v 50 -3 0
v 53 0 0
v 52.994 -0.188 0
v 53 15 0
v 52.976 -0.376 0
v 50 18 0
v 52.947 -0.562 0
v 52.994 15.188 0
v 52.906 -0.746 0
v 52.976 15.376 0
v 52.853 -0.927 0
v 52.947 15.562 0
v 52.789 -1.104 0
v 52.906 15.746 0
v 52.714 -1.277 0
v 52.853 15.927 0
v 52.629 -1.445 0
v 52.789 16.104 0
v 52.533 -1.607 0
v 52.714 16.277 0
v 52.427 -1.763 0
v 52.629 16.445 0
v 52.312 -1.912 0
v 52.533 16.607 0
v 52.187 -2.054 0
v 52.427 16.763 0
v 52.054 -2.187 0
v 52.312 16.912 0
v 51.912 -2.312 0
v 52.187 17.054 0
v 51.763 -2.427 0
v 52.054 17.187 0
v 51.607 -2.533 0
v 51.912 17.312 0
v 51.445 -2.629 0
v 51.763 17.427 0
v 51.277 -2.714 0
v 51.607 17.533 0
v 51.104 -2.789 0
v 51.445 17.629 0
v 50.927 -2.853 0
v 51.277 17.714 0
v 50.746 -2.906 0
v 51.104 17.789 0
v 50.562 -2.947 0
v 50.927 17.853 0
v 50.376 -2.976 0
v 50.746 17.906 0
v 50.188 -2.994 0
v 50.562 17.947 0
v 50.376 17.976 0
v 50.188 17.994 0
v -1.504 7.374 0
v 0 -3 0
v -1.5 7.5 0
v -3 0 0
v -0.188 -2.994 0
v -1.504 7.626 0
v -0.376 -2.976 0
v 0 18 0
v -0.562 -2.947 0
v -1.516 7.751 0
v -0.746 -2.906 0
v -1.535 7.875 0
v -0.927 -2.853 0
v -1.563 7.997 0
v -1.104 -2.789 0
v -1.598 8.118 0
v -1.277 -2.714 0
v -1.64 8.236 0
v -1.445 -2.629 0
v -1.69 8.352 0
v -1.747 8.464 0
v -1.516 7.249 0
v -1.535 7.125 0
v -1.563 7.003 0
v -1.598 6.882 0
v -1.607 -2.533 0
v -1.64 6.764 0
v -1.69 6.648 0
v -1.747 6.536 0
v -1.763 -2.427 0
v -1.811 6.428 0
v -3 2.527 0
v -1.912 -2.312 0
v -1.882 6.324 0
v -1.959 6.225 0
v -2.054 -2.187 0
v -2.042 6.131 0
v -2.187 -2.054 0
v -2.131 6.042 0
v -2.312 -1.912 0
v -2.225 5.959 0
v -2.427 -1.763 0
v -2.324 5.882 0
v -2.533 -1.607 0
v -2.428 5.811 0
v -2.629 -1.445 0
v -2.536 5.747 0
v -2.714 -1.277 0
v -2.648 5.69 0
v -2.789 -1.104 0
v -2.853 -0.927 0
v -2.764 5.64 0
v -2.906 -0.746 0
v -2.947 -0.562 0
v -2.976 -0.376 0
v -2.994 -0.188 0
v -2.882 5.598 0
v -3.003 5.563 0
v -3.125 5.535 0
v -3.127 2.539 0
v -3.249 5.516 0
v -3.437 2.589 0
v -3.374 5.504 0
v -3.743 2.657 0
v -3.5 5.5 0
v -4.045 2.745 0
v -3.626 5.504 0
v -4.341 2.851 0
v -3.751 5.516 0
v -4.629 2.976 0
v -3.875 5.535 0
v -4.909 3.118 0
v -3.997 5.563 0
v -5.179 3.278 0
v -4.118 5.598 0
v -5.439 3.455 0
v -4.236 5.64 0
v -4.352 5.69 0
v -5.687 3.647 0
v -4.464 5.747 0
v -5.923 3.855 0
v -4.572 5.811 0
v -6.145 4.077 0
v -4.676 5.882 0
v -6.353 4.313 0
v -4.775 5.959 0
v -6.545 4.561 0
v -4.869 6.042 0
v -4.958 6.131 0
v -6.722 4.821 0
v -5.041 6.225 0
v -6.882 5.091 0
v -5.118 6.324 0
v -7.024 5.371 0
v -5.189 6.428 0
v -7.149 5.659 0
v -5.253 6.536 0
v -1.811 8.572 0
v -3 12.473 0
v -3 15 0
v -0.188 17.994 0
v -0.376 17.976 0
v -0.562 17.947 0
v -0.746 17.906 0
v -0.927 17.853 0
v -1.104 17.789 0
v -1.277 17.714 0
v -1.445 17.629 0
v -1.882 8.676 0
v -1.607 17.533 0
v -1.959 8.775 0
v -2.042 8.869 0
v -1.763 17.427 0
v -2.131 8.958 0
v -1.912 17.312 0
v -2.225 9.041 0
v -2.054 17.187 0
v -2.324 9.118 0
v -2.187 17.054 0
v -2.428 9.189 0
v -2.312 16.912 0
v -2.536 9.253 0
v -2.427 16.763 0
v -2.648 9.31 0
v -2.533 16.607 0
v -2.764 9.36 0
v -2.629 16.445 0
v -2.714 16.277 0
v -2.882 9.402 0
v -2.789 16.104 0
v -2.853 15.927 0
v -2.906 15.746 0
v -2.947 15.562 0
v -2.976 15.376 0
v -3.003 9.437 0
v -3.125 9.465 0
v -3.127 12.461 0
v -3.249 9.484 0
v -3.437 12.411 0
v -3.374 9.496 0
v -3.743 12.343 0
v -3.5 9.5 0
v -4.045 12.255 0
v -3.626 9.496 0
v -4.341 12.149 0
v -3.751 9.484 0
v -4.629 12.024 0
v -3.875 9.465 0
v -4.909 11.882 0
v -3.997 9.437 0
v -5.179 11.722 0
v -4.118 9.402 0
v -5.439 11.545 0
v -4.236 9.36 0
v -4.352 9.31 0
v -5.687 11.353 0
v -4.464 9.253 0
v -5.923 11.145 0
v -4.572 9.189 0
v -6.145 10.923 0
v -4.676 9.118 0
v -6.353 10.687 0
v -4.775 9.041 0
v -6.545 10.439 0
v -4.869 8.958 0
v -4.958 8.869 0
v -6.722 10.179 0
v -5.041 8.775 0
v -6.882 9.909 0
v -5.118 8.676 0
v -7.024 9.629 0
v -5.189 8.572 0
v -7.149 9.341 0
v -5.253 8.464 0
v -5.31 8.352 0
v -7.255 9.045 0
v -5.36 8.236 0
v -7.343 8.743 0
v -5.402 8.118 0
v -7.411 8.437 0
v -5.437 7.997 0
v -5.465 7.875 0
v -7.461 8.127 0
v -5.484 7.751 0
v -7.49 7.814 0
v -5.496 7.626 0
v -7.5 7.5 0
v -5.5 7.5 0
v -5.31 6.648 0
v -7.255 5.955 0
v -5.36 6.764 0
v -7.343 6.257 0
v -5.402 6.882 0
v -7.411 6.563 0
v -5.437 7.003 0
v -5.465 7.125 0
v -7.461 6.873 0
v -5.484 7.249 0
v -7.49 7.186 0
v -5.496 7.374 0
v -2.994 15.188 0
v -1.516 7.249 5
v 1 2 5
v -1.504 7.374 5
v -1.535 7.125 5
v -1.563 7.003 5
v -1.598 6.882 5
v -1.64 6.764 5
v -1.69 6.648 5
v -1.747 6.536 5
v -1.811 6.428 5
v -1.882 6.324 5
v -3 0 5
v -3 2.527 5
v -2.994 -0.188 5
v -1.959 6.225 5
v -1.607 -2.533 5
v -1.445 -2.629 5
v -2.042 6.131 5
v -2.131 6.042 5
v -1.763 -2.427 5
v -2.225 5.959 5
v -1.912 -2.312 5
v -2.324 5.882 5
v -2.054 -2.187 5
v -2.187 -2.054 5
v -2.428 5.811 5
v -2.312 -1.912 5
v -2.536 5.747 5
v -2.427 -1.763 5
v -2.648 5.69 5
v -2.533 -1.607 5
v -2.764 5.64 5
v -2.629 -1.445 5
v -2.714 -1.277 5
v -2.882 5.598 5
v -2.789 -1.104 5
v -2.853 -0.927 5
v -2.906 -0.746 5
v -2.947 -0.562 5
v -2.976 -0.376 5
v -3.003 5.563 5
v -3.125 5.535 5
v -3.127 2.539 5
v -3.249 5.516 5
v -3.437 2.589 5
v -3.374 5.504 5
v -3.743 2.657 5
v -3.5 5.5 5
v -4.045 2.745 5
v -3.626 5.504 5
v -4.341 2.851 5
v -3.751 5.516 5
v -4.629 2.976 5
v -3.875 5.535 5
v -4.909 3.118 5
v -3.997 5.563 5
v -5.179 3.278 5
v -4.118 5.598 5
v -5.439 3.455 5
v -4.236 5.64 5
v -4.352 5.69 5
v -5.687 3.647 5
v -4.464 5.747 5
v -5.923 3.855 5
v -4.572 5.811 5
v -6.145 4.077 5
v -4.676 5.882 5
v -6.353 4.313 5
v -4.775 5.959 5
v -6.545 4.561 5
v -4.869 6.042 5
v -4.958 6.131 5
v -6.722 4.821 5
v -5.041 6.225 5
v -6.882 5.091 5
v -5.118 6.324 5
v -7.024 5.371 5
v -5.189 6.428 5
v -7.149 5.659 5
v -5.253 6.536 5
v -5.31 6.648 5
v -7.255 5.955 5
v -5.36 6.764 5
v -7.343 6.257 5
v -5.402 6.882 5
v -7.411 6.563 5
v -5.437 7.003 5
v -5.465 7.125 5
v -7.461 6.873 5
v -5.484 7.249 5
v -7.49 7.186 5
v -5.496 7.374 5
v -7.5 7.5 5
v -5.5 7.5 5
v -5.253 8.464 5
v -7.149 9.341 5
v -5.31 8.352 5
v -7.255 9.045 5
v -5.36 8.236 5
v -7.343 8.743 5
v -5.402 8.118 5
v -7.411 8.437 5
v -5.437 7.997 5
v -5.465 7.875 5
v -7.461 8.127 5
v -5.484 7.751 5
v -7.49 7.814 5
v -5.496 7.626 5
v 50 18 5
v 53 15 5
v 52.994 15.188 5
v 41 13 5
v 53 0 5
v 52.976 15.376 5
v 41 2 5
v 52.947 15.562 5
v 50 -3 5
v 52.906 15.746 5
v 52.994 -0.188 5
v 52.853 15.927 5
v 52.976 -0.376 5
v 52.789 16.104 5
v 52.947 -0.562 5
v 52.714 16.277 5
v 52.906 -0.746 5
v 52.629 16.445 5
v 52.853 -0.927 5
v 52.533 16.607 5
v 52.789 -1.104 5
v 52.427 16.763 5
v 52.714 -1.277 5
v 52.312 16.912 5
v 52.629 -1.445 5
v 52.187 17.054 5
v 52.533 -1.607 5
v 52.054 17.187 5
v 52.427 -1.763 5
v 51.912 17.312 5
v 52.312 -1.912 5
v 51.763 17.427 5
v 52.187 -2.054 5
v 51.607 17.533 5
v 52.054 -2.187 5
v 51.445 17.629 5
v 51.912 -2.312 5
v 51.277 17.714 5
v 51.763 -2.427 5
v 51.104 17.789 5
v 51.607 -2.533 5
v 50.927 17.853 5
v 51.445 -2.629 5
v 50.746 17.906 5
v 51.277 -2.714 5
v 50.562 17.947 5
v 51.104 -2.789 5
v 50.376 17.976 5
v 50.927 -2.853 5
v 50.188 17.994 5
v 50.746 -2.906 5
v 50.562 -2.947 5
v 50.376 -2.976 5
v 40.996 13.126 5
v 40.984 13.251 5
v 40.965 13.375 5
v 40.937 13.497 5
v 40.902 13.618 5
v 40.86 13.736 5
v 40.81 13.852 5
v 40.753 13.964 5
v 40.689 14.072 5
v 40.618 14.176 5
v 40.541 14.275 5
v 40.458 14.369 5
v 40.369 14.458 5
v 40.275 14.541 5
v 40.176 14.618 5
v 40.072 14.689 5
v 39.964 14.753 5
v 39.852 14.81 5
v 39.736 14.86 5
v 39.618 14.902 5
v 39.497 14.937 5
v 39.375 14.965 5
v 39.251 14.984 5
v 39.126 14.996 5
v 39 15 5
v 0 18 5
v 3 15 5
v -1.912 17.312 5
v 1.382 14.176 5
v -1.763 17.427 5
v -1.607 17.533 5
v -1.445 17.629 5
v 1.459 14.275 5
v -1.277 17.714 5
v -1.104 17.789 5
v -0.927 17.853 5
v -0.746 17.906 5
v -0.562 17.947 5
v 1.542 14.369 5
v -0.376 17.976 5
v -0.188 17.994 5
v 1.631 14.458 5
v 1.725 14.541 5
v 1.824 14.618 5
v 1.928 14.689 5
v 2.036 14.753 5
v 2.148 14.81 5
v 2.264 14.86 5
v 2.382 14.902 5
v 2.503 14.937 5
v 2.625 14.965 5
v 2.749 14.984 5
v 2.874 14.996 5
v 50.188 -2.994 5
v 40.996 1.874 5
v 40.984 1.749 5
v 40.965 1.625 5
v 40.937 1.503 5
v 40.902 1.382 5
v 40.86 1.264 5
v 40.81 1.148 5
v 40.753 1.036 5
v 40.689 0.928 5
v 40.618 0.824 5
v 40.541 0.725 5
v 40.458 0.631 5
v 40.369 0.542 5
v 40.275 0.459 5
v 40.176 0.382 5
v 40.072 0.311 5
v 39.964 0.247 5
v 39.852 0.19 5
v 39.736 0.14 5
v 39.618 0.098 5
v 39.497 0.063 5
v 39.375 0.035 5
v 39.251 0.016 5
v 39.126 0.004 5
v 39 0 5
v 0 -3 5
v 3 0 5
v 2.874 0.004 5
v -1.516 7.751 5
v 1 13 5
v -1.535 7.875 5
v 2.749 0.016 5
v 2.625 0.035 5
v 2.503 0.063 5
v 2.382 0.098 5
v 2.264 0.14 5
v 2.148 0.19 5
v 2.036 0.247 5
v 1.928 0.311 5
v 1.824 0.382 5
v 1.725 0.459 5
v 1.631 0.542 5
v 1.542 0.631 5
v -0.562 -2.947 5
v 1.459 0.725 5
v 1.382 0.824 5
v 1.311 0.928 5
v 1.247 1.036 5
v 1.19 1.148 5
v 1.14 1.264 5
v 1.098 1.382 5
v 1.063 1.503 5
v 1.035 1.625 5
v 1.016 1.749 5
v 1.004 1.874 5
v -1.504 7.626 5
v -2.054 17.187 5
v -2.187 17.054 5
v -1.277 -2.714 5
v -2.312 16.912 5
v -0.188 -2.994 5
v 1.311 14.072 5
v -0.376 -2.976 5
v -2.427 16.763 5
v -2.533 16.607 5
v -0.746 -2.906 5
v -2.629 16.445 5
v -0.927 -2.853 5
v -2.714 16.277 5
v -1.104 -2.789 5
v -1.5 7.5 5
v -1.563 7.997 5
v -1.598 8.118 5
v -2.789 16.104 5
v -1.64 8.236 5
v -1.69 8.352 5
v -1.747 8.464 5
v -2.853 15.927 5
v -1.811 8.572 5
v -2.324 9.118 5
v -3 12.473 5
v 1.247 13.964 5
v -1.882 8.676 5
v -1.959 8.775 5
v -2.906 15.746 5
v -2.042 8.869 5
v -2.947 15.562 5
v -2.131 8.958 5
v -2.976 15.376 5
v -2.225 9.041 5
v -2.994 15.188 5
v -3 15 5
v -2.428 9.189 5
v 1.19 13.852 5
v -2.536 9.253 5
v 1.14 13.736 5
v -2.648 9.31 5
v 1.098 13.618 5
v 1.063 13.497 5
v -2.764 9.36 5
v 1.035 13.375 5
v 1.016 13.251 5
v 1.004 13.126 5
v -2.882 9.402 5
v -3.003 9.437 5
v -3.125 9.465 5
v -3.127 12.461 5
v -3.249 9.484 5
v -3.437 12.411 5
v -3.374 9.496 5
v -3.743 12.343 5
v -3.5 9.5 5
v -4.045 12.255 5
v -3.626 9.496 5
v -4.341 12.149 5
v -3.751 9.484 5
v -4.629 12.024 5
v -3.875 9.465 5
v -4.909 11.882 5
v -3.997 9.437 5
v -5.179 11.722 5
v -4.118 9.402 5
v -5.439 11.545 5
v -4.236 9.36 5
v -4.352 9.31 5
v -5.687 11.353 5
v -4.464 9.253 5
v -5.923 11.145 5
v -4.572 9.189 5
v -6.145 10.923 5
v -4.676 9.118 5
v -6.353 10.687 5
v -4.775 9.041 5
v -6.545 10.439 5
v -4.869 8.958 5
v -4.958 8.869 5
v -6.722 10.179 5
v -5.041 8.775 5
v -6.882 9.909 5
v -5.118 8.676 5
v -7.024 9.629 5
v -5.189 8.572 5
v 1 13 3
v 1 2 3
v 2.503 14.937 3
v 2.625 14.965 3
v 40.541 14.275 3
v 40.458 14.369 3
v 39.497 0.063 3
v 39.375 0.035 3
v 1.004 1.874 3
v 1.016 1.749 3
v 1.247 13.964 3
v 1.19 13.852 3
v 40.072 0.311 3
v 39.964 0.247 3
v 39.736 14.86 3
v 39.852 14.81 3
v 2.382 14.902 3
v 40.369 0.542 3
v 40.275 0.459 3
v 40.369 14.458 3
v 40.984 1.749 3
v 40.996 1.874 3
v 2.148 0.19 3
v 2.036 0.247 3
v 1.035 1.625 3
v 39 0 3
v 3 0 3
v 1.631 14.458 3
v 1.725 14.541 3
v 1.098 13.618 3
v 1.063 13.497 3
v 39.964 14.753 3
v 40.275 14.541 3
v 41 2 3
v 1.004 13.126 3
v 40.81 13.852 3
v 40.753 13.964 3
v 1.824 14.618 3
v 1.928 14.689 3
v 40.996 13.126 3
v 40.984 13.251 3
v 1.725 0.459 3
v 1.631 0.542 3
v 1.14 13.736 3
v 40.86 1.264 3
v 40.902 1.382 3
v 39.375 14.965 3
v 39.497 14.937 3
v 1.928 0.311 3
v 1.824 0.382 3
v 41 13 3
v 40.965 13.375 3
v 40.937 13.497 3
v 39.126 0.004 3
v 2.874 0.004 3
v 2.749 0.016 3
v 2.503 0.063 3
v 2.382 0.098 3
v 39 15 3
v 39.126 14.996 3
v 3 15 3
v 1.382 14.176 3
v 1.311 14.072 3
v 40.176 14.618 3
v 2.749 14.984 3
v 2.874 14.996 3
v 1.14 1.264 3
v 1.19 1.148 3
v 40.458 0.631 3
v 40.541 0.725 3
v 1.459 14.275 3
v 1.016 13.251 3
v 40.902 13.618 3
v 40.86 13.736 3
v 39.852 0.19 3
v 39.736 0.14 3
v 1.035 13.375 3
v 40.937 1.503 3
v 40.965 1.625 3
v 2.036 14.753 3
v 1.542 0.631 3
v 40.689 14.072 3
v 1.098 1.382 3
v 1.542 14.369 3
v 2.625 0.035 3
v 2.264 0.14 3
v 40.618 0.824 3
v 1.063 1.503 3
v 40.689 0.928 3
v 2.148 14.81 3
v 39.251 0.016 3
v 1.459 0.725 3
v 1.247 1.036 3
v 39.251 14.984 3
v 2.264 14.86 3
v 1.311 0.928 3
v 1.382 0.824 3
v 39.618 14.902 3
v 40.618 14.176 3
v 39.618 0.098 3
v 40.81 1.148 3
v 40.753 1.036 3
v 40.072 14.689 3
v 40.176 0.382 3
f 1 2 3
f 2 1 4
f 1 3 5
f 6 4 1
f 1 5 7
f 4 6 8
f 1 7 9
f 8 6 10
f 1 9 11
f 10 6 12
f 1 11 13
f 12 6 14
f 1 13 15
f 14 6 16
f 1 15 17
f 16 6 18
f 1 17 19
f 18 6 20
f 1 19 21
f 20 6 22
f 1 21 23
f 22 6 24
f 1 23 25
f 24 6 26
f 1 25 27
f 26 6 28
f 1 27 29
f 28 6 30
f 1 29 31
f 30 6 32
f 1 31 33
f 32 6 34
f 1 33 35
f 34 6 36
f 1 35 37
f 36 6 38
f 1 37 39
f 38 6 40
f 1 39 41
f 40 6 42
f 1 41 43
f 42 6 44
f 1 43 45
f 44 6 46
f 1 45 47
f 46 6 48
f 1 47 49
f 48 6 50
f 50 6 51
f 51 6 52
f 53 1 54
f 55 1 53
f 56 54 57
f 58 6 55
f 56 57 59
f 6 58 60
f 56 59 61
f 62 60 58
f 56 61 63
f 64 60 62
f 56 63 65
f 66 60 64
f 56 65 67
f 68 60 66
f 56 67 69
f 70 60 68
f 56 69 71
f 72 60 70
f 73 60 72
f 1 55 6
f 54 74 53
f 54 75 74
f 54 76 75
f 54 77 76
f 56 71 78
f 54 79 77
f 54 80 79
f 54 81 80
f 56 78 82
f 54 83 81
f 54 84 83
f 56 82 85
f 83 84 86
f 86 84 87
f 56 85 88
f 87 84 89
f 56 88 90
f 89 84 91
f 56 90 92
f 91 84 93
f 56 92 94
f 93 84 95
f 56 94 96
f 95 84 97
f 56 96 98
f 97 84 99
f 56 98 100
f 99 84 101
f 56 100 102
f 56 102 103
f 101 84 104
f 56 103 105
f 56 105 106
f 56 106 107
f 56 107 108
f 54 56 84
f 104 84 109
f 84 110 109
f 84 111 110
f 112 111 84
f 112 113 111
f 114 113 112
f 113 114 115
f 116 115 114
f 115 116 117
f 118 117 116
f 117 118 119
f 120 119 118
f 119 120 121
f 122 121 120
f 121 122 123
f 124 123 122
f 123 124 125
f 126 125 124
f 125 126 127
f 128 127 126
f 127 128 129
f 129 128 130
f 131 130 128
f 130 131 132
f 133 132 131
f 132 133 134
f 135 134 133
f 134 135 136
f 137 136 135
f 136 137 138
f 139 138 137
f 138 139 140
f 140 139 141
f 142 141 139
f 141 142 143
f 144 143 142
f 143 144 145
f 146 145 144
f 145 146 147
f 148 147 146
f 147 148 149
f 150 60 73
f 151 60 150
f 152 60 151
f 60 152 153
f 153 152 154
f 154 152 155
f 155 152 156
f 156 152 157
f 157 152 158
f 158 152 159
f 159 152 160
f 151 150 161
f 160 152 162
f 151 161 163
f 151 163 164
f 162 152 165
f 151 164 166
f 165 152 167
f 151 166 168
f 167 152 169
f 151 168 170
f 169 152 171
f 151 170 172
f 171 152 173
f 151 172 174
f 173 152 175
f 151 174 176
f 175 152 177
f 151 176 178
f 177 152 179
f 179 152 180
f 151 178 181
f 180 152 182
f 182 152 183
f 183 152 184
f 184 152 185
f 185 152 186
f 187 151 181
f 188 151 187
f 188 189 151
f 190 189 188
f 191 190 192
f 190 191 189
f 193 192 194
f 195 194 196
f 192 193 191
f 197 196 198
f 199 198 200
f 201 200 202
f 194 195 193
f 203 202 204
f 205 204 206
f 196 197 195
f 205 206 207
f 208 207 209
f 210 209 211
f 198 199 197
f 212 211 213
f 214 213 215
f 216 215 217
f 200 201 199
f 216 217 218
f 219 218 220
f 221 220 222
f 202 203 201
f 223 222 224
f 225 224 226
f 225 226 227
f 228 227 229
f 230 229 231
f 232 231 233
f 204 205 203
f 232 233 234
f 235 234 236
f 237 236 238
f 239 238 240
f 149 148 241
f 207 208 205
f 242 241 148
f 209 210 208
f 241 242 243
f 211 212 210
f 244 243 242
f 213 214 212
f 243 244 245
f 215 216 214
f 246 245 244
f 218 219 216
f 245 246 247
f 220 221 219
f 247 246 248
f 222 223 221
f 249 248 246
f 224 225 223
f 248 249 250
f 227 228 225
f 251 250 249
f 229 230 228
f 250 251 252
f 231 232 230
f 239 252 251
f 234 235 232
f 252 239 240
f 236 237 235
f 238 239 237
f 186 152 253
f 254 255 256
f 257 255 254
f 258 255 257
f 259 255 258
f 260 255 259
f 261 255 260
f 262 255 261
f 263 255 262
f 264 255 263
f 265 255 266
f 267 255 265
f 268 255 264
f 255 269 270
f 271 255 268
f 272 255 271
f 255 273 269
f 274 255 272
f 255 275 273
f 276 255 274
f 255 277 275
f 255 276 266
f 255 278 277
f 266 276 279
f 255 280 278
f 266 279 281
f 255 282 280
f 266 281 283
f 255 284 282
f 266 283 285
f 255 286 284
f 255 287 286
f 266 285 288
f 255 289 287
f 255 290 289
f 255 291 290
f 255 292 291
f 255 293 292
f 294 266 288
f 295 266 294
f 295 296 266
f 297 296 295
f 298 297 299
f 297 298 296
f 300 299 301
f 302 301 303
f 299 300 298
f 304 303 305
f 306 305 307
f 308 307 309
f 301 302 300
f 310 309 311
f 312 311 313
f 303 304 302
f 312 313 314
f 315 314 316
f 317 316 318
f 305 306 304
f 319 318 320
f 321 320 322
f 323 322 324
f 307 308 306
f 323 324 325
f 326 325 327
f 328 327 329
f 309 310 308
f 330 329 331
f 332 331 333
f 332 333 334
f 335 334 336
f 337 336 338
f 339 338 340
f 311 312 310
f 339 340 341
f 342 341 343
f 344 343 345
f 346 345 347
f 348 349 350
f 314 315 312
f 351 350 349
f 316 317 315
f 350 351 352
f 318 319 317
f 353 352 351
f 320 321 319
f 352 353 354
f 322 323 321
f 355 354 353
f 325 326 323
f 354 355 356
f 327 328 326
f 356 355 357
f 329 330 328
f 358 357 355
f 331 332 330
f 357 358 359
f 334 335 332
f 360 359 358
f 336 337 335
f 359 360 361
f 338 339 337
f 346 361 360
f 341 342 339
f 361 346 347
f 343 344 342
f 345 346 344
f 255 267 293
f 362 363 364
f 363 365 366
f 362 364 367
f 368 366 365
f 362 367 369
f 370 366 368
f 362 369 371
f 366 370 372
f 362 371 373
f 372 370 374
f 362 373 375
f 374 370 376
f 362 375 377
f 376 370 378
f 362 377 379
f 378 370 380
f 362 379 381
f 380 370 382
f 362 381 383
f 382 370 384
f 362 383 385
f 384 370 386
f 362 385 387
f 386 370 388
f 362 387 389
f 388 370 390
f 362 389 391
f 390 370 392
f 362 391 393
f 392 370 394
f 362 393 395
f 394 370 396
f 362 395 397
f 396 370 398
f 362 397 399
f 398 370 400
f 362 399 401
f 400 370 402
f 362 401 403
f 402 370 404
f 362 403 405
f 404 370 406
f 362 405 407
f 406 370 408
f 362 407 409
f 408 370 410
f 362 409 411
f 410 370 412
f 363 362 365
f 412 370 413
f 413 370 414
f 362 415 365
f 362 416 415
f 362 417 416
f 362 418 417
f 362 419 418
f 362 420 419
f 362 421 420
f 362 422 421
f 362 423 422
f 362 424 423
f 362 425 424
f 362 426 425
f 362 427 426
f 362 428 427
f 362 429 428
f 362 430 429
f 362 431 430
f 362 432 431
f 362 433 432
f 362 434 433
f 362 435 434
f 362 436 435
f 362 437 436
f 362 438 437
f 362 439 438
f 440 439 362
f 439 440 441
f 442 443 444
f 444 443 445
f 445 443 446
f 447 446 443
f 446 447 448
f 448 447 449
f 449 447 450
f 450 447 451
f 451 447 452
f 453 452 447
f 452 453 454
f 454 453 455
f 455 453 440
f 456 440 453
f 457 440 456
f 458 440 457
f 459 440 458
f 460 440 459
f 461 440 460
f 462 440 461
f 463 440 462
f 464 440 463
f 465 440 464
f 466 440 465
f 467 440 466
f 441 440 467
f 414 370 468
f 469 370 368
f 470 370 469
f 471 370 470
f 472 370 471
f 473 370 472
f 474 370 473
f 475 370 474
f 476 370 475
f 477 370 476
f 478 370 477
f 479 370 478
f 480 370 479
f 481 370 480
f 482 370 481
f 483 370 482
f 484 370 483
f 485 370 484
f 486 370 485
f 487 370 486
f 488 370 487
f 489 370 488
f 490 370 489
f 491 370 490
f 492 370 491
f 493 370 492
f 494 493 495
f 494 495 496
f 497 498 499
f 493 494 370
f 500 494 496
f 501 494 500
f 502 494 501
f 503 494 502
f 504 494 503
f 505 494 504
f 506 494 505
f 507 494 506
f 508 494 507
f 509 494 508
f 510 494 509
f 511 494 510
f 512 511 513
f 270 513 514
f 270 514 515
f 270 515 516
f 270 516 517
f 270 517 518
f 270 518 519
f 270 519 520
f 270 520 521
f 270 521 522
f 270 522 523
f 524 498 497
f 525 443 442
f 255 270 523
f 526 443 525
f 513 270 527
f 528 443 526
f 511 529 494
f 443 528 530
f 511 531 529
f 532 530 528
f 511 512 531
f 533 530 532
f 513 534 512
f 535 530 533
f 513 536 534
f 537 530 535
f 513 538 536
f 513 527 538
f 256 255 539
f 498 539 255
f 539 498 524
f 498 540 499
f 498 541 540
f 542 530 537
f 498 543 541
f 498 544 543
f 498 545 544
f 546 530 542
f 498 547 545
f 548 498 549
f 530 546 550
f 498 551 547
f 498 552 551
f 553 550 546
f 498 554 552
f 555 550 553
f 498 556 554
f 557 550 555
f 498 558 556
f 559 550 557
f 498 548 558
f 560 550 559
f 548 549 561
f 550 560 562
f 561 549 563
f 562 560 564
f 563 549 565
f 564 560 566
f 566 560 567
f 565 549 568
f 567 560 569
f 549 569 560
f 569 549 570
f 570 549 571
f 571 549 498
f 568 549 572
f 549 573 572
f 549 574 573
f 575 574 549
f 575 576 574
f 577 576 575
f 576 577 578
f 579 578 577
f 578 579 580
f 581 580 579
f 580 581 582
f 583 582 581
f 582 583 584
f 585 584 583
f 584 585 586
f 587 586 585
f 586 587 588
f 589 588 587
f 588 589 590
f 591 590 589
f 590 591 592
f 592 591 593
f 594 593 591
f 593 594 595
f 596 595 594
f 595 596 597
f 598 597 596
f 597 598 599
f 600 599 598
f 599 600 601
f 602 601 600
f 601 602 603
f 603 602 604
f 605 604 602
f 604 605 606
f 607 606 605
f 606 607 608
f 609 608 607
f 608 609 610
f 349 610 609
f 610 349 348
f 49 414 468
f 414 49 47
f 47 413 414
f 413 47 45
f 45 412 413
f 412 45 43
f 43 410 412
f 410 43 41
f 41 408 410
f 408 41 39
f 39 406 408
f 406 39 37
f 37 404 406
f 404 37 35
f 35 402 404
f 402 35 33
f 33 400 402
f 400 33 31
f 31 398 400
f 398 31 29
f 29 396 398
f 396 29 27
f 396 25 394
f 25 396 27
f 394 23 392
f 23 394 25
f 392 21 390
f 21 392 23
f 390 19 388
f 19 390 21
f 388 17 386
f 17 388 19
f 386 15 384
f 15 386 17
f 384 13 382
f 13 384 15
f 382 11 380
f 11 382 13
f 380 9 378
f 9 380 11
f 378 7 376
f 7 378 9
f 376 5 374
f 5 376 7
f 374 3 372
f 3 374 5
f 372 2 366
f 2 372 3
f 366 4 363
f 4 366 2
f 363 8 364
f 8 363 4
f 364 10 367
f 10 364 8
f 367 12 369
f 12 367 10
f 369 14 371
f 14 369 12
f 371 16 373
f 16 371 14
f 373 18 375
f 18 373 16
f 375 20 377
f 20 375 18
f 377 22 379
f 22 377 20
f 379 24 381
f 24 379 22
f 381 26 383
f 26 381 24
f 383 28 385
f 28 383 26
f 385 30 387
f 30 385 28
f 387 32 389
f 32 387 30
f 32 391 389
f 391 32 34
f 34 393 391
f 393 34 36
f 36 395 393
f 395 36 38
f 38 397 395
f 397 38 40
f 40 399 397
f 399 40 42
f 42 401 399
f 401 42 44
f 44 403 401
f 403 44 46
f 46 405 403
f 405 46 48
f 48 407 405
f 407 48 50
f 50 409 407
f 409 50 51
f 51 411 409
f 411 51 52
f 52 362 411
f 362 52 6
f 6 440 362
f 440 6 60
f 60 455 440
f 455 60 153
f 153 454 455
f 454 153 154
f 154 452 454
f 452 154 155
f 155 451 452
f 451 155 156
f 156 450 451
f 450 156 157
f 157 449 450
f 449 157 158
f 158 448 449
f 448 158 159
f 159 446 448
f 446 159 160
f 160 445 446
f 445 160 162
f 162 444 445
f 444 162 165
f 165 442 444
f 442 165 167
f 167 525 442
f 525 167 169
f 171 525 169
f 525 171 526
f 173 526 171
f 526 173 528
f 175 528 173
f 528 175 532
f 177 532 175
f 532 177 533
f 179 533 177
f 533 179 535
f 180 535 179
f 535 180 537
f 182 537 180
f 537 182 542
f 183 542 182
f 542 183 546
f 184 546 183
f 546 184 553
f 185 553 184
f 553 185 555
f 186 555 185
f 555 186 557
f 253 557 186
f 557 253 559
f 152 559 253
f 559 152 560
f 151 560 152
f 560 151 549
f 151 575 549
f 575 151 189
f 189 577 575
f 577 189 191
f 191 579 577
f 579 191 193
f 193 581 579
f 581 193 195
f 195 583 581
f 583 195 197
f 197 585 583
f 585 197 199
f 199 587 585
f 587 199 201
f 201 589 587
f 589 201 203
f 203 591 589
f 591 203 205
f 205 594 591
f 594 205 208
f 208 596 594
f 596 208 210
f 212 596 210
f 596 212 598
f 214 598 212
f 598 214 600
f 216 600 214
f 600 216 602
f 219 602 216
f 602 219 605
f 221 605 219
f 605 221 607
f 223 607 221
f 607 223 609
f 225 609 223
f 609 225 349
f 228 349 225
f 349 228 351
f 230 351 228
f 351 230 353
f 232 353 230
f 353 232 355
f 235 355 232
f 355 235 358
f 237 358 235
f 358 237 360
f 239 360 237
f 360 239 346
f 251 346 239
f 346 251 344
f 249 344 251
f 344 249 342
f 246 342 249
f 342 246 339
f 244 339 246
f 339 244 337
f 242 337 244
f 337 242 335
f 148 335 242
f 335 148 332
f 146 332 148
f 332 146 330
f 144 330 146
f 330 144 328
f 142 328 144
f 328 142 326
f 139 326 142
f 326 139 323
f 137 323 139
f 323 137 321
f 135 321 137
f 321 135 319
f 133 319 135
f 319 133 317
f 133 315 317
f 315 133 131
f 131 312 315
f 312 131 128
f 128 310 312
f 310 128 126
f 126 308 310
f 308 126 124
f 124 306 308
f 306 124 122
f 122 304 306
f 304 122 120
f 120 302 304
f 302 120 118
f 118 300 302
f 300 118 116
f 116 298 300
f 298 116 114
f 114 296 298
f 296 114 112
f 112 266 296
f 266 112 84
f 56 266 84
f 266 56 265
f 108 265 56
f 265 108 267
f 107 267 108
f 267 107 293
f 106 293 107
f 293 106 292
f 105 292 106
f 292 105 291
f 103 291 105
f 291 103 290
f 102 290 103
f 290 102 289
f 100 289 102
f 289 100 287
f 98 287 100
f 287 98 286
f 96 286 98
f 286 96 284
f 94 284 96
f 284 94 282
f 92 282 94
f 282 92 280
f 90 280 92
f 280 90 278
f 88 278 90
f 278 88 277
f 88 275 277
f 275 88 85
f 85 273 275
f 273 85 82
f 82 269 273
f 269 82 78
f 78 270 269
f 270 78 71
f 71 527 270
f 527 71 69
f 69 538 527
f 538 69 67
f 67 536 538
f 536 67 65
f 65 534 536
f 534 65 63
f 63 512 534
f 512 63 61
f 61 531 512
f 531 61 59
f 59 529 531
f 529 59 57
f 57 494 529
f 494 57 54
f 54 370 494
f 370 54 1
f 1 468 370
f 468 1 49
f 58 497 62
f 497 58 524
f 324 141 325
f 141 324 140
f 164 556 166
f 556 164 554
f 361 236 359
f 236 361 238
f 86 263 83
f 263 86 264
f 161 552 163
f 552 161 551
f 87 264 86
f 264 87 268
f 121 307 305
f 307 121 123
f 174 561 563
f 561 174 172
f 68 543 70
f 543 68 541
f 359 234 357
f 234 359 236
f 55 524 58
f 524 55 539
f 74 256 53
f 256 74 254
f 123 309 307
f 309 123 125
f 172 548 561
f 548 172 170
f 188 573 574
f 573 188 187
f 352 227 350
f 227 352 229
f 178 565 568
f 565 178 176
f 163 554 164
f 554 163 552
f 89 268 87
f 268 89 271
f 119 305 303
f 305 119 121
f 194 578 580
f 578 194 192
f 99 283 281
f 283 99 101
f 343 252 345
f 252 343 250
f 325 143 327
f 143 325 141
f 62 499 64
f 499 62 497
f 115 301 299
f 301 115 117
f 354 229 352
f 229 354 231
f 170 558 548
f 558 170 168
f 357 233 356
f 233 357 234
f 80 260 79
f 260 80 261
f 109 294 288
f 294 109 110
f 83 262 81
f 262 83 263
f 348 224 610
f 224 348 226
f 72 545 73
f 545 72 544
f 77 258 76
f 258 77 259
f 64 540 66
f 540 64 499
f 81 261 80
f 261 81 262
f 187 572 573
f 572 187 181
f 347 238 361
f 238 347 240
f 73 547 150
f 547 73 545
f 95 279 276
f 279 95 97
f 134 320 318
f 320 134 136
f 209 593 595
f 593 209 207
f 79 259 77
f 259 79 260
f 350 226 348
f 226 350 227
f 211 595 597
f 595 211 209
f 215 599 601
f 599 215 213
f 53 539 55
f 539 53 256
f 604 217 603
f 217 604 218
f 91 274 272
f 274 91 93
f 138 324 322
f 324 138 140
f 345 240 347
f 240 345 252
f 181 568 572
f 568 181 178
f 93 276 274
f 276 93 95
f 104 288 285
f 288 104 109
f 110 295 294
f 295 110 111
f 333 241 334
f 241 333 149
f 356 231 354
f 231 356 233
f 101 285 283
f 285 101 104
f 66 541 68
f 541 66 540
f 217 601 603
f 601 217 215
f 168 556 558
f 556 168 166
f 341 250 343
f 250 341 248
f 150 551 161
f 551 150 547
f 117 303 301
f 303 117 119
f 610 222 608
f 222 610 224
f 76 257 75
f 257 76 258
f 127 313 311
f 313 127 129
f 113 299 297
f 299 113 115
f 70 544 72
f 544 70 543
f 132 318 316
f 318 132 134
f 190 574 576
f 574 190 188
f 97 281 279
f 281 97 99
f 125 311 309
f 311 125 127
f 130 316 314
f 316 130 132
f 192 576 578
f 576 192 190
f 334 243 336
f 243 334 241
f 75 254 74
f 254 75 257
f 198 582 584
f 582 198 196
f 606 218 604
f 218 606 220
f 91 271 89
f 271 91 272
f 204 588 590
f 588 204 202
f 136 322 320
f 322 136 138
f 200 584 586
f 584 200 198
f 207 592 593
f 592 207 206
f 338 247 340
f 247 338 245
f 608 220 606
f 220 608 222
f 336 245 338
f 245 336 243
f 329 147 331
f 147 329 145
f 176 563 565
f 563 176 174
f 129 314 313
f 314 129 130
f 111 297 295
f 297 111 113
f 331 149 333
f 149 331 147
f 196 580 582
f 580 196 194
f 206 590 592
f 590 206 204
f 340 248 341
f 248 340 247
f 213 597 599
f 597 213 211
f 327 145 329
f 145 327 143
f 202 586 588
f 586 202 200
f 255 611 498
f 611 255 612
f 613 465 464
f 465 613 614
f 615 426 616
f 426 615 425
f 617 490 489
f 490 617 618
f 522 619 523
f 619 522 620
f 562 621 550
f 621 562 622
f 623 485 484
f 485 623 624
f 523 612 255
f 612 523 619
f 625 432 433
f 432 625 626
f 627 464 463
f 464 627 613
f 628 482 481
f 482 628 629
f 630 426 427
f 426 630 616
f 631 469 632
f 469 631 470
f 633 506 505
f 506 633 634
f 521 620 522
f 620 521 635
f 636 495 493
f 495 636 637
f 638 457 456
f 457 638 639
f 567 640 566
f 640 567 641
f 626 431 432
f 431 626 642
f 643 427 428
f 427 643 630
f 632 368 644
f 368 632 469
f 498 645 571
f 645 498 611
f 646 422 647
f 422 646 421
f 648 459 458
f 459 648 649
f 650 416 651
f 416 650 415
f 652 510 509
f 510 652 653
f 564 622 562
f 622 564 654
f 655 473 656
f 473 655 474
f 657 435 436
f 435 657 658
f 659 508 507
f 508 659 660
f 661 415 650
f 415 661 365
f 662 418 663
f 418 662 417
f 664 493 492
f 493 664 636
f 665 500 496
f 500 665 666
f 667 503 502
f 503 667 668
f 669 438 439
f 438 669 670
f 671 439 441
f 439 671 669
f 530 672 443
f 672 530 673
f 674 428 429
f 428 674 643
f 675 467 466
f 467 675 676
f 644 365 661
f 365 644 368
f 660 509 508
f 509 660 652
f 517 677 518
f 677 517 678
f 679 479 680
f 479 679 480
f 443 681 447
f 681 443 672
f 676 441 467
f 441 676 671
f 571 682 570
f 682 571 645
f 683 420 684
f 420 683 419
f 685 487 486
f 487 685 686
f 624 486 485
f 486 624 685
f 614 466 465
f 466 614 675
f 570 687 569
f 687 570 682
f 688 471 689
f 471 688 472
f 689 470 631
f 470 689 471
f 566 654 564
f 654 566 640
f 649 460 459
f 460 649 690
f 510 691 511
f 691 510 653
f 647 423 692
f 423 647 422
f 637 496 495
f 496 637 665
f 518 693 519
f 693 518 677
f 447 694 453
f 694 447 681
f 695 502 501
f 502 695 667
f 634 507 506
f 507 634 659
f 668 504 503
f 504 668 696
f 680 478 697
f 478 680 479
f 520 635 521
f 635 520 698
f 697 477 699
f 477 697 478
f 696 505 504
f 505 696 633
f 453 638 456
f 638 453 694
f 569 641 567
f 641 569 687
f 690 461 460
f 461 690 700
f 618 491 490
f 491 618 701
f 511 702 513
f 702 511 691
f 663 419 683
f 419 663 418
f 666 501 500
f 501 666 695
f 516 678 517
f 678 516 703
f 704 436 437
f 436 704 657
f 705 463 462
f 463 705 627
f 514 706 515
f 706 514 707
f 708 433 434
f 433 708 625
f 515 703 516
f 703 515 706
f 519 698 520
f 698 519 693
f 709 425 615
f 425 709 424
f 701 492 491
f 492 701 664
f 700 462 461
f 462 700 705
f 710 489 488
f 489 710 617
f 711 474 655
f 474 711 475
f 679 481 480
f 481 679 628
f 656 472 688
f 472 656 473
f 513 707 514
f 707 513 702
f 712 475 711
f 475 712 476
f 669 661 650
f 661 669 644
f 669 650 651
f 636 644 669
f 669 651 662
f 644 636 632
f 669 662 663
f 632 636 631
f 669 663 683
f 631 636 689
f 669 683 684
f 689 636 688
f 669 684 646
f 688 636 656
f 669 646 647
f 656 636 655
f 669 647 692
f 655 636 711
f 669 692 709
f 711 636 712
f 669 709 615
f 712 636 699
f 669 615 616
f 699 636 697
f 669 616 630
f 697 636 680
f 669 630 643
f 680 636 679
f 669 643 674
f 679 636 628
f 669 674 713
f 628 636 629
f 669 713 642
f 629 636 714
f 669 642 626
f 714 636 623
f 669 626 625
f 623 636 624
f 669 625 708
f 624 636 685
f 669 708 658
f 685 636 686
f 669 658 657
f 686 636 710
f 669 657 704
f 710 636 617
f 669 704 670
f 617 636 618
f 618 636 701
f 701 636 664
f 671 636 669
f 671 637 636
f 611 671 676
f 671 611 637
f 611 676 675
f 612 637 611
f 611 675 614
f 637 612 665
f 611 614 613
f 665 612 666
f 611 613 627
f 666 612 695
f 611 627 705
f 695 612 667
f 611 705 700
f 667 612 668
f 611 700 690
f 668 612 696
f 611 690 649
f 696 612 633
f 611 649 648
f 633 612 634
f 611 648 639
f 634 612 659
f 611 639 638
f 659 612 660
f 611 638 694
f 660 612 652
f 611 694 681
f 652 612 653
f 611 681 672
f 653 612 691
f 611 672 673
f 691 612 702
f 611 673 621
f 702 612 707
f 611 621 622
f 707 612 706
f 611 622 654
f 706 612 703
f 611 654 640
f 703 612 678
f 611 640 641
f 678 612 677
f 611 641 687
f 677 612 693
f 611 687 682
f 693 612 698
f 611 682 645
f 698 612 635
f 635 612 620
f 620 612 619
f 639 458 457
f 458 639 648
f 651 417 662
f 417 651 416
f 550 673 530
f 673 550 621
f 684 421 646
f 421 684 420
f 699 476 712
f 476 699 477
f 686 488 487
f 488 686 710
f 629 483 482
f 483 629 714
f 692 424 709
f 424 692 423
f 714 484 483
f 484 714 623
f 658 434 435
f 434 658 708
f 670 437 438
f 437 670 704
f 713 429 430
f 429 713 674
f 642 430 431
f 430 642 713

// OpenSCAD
difference() {
    linear_extrude(5) union() {
        hull(){
            translate([0,0,0]) circle(3,$fn=100);
            translate([50,0,0]) circle(3,$fn=100);
            translate([50,15,0]) circle(3,$fn=100);
            translate([0,15,0]) circle(3,$fn=100);
        }
        translate([-2.5,7.5,0]) circle(5,$fn=100);
    }
    translate([-3.5,7.5,0]) linear_extrude(5) circle(2,$fn=100);
    color("red") translate([1,0,3]) linear_extrude(3) hull(){
        translate([2,2,0]) circle(2,$fn=100);
        translate([38,2,0]) circle(2,$fn=100);
        translate([38,13,0]) circle(2,$fn=100);
        translate([2,13,0]) circle(2,$fn=100);
    }
}
